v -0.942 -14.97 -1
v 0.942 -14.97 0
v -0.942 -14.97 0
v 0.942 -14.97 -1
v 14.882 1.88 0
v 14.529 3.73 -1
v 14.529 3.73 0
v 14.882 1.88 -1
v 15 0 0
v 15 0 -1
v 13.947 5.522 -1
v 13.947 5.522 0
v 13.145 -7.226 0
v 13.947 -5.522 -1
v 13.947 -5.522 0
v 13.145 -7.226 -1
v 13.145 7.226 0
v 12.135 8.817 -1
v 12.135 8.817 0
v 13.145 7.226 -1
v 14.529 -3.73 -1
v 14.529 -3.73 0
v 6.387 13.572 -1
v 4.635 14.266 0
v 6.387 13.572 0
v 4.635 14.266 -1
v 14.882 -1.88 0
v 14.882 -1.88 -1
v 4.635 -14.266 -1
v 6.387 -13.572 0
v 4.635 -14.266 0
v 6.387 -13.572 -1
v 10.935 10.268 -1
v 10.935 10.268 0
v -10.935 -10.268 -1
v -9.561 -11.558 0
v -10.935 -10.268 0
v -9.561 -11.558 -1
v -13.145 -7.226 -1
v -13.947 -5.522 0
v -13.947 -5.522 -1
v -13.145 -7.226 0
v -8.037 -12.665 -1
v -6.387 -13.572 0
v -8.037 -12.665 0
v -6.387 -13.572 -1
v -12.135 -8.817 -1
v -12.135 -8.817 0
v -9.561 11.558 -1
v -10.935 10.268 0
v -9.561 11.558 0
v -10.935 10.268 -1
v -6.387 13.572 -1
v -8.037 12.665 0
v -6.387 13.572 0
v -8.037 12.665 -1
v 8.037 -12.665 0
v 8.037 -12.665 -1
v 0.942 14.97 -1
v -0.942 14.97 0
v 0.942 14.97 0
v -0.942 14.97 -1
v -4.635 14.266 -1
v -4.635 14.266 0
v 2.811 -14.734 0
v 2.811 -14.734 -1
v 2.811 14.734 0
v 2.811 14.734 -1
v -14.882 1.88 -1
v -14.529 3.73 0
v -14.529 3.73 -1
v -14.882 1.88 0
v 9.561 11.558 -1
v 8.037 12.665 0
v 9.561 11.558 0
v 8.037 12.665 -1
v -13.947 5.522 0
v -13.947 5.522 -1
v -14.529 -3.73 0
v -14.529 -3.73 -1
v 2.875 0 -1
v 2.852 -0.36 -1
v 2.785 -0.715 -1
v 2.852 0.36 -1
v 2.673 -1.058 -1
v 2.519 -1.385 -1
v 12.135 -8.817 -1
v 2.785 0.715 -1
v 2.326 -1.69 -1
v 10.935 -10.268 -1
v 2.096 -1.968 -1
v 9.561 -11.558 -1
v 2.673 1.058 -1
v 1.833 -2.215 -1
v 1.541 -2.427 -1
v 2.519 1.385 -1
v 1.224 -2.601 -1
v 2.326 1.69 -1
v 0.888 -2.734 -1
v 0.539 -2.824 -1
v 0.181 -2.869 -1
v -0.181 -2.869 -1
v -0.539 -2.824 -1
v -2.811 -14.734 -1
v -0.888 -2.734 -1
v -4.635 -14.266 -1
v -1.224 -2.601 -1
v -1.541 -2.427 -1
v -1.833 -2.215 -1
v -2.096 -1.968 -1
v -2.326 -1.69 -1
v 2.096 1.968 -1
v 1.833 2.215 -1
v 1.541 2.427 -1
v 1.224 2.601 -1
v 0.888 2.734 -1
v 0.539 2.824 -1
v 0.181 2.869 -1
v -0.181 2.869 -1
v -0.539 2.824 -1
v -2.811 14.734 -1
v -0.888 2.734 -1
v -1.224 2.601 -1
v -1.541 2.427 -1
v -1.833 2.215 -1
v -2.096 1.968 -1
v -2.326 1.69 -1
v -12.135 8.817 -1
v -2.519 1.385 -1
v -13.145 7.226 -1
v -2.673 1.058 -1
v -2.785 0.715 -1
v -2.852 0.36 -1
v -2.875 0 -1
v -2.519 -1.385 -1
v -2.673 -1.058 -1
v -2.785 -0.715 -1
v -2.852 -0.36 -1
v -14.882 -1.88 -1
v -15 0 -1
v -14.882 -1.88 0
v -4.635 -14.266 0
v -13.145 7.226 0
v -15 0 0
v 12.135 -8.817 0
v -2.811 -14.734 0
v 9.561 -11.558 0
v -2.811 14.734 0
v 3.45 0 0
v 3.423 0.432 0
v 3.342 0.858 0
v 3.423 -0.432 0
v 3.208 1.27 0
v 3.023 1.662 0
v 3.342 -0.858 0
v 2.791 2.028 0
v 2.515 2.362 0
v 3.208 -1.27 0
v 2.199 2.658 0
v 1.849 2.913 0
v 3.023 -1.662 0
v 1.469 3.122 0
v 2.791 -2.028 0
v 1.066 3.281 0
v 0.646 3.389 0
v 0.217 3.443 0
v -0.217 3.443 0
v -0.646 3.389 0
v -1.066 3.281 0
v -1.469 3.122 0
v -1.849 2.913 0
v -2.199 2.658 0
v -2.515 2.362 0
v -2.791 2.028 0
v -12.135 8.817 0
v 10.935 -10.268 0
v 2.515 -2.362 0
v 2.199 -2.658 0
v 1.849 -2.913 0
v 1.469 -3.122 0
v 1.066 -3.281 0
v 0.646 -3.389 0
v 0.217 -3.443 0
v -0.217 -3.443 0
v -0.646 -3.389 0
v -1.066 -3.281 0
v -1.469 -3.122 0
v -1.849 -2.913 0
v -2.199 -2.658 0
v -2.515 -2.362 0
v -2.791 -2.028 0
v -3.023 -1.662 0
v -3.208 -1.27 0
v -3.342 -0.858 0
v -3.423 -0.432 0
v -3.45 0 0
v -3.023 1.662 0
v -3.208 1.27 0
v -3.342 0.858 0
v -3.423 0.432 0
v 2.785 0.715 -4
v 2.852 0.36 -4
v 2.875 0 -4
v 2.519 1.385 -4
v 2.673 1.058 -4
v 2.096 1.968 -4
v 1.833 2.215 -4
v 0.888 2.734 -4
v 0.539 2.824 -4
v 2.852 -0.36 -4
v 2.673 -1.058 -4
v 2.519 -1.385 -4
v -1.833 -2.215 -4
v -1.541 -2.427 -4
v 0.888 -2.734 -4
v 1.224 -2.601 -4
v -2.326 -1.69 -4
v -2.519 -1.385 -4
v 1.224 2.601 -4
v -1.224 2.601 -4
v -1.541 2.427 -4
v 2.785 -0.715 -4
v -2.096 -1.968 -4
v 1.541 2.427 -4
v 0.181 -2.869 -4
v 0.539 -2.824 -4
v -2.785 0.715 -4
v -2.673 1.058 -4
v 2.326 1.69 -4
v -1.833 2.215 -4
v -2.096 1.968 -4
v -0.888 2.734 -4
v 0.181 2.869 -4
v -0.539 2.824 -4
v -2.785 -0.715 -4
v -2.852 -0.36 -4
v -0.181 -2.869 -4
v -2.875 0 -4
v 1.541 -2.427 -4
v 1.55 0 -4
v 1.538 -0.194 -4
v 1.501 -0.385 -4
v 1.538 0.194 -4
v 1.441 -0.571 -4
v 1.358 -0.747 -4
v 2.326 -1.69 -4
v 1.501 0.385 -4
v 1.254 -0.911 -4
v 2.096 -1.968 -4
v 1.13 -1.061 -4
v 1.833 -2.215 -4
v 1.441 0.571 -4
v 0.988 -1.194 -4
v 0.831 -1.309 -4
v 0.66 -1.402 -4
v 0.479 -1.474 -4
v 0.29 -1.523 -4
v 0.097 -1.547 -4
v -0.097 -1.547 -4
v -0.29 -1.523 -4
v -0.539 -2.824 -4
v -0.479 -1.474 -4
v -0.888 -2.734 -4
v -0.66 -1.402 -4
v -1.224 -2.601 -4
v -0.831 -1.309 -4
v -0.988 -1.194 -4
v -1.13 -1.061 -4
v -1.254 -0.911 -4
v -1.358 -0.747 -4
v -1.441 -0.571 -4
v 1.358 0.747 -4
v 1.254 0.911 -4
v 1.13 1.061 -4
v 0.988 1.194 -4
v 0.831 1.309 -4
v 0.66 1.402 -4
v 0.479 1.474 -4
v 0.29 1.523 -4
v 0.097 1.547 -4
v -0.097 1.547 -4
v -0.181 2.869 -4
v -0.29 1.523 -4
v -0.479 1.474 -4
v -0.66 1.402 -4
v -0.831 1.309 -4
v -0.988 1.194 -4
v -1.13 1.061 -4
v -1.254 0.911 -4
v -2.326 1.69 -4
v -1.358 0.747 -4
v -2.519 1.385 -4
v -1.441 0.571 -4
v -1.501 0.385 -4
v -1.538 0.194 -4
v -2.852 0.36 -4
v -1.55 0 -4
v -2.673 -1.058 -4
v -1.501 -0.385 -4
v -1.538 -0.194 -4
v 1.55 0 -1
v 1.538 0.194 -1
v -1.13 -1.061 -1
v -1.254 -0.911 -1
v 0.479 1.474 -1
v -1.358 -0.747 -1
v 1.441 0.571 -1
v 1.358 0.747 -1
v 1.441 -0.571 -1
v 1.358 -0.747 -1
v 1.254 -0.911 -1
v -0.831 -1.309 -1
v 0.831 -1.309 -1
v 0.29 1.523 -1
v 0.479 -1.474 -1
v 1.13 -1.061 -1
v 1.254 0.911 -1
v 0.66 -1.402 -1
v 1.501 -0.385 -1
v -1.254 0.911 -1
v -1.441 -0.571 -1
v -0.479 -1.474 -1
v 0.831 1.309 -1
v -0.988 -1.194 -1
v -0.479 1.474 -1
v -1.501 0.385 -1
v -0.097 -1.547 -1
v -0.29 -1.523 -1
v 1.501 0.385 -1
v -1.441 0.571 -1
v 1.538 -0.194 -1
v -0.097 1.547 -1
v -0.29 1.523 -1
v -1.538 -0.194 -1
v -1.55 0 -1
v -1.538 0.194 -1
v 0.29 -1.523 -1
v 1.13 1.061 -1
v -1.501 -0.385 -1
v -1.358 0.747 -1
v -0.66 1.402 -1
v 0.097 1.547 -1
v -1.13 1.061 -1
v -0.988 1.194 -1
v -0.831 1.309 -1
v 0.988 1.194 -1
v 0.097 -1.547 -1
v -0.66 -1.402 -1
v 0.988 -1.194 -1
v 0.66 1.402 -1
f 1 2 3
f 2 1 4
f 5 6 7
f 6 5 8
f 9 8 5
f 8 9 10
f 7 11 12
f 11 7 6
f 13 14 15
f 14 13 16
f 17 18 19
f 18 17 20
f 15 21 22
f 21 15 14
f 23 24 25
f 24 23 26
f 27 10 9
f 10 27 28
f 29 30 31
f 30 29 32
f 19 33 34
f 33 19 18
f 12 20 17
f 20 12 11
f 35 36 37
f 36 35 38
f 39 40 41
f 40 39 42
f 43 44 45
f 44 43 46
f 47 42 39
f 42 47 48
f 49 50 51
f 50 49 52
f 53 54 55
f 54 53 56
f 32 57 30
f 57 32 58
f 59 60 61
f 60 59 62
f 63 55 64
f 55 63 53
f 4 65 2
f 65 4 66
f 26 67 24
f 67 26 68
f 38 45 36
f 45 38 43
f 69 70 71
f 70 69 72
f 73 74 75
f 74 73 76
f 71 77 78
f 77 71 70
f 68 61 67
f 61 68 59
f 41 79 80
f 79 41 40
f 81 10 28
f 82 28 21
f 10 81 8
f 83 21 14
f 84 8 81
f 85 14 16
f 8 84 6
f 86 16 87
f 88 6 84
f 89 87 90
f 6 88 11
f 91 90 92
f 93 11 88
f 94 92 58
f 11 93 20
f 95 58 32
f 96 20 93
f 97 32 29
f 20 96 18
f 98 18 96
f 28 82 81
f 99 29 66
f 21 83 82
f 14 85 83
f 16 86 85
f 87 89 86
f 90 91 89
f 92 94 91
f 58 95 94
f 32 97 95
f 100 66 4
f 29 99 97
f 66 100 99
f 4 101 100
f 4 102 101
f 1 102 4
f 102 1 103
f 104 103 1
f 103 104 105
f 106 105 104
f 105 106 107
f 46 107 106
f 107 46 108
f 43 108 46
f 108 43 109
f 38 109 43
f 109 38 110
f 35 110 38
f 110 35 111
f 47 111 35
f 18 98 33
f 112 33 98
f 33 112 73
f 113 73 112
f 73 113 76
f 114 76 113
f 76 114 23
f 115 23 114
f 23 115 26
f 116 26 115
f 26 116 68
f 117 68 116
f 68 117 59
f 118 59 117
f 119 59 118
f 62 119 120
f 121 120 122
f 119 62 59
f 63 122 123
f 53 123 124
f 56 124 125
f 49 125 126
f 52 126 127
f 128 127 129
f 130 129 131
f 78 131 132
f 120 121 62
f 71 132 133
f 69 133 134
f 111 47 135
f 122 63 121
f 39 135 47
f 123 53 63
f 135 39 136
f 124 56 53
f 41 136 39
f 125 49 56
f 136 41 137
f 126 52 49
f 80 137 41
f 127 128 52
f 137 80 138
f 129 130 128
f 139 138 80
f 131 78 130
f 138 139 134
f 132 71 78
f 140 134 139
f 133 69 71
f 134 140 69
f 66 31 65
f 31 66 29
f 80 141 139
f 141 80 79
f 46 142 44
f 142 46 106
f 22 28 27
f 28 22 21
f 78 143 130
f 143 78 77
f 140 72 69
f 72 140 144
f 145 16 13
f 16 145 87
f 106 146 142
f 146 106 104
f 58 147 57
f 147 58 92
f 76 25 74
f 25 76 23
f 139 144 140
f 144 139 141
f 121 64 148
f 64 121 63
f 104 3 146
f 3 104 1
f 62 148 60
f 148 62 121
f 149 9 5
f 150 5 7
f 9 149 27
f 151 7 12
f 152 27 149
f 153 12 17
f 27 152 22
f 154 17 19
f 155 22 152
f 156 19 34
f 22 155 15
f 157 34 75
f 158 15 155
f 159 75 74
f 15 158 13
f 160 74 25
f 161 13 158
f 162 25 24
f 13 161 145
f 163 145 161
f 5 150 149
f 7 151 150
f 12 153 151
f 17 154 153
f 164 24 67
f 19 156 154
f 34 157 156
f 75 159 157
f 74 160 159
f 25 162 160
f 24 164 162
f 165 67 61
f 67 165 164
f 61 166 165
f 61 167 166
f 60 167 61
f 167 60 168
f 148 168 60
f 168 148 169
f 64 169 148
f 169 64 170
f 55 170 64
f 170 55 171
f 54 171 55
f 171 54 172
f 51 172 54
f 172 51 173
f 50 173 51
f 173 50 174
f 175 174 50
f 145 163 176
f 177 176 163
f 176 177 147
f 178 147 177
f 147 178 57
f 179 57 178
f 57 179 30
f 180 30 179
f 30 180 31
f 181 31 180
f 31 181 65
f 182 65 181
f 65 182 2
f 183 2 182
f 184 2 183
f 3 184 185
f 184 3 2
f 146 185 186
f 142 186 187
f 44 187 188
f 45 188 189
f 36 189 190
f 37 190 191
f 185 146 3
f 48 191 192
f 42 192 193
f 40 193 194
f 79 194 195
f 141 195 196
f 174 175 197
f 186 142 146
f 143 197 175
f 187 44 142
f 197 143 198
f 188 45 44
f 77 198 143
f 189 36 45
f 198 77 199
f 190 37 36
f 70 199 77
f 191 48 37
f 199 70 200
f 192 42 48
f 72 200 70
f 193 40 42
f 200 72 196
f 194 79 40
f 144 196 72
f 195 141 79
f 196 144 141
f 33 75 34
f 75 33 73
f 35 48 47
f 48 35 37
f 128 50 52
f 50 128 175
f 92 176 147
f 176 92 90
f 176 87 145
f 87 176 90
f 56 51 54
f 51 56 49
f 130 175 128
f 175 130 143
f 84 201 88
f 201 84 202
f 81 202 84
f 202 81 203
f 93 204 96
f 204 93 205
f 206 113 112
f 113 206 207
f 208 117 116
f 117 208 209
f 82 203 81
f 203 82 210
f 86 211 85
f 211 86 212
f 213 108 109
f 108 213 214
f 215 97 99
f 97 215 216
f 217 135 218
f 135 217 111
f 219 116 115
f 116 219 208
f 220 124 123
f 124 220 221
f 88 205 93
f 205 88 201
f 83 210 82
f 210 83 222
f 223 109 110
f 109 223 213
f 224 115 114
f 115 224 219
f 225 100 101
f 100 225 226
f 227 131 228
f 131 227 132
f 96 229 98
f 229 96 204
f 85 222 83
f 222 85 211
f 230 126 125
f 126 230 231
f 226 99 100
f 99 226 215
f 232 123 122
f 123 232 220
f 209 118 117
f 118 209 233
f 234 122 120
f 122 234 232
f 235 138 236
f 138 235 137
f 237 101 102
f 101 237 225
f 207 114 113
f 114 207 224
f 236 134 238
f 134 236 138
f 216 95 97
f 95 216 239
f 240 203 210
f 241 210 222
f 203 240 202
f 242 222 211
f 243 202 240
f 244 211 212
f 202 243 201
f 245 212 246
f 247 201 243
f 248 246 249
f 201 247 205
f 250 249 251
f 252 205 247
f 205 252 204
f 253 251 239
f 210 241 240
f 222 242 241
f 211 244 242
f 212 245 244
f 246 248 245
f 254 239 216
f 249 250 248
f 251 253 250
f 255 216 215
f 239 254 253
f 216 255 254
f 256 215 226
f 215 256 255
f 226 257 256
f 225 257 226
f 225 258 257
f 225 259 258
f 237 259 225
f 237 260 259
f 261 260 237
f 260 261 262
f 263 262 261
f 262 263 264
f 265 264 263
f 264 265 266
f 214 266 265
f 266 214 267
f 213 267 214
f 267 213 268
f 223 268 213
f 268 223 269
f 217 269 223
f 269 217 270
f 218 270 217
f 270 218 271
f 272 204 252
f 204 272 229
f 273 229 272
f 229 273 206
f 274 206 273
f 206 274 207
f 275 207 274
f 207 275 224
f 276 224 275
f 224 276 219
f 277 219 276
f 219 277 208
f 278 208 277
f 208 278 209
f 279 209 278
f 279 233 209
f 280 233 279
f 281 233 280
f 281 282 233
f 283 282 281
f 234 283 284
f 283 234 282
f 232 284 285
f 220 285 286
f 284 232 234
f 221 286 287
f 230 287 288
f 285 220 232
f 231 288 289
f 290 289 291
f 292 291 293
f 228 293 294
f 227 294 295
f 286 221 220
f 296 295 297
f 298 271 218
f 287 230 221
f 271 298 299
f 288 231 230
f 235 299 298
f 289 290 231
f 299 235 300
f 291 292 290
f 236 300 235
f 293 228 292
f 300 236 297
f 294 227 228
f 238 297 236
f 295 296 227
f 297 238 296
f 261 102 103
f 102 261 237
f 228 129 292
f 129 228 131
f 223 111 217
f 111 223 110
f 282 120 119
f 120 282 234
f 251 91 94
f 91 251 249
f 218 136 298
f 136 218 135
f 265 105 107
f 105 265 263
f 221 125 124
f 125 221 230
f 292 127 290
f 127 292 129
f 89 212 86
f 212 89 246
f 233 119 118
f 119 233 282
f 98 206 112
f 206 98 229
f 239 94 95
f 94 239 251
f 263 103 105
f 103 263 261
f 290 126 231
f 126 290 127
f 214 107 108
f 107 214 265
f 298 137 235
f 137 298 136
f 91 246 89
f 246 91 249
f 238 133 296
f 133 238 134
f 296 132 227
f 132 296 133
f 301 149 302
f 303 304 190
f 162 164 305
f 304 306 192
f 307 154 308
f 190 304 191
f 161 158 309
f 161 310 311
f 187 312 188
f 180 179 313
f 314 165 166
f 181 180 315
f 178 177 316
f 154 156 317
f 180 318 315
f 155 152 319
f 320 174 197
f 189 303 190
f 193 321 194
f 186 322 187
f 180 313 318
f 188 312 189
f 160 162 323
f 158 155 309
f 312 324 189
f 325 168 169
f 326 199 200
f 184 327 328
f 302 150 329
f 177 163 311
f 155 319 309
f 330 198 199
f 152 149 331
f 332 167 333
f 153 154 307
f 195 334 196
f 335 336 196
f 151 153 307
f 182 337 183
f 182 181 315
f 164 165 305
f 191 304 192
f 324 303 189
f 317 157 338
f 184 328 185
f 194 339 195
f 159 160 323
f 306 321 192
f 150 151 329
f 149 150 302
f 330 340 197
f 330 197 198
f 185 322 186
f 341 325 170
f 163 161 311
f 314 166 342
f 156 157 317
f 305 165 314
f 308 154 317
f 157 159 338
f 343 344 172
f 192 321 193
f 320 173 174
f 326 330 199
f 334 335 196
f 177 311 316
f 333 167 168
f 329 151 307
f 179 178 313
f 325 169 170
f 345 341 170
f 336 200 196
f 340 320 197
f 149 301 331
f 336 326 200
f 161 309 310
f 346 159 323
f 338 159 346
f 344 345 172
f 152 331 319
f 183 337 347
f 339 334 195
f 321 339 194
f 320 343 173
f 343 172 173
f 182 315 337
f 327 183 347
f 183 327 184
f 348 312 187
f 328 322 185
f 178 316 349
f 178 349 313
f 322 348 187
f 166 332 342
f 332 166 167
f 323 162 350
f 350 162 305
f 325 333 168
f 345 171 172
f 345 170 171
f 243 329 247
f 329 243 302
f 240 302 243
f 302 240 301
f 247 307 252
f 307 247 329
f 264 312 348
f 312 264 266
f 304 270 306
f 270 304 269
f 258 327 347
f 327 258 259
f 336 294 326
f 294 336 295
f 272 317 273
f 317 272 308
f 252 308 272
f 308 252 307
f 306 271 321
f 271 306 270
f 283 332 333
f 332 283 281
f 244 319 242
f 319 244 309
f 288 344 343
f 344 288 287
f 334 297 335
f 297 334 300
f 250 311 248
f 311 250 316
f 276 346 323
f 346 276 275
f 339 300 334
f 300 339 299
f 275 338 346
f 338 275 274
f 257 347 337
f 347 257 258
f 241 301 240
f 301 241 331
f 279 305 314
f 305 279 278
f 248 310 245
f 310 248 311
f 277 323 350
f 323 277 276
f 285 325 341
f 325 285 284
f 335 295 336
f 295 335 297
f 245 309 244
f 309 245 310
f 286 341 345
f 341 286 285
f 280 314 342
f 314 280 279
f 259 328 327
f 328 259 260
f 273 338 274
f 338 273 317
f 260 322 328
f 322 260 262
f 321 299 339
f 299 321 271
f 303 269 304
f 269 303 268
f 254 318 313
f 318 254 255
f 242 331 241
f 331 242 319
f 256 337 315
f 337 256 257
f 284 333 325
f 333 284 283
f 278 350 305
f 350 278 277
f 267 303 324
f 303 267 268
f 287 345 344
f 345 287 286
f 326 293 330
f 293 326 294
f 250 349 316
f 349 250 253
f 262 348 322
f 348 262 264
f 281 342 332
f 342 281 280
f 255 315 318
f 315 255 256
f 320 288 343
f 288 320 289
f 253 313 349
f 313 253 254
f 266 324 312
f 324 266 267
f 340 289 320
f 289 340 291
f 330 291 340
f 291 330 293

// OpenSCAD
$fn = 50;


difference() {
	union() {
		translate(v = [0, 0, -1.0000000000]) {
			cylinder(h = 1.0000000000, r = 15.0000000000);
		}
		#translate(v = [0, 0, -4.0000000000]) {
			cylinder(h = 4.0000000000, r = 2.8750000000);
		}
	}
	union() {
		translate(v = [0, 0, 0]) {
			rotate(a = [0, 0, 0]) {
				difference() {
					union() {
						translate(v = [0, 0, -4.0000000000]) {
							cylinder(h = 4.0000000000, r = 1.2500000000);
						}
						translate(v = [0, 0, -1.0000000000]) {
							cylinder(h = 1.0000000000, r1 = 1.5500000000, r2 = 3.4500000000);
						}
						translate(v = [0, 0, -4.0000000000]) {
							cylinder(h = 4.0000000000, r = 1.5500000000);
						}
						translate(v = [0, 0, -4.0000000000]) {
							cylinder(h = 4.0000000000, r = 1.2500000000);
						}
					}
					union();
				}
			}
		}
	}
}
